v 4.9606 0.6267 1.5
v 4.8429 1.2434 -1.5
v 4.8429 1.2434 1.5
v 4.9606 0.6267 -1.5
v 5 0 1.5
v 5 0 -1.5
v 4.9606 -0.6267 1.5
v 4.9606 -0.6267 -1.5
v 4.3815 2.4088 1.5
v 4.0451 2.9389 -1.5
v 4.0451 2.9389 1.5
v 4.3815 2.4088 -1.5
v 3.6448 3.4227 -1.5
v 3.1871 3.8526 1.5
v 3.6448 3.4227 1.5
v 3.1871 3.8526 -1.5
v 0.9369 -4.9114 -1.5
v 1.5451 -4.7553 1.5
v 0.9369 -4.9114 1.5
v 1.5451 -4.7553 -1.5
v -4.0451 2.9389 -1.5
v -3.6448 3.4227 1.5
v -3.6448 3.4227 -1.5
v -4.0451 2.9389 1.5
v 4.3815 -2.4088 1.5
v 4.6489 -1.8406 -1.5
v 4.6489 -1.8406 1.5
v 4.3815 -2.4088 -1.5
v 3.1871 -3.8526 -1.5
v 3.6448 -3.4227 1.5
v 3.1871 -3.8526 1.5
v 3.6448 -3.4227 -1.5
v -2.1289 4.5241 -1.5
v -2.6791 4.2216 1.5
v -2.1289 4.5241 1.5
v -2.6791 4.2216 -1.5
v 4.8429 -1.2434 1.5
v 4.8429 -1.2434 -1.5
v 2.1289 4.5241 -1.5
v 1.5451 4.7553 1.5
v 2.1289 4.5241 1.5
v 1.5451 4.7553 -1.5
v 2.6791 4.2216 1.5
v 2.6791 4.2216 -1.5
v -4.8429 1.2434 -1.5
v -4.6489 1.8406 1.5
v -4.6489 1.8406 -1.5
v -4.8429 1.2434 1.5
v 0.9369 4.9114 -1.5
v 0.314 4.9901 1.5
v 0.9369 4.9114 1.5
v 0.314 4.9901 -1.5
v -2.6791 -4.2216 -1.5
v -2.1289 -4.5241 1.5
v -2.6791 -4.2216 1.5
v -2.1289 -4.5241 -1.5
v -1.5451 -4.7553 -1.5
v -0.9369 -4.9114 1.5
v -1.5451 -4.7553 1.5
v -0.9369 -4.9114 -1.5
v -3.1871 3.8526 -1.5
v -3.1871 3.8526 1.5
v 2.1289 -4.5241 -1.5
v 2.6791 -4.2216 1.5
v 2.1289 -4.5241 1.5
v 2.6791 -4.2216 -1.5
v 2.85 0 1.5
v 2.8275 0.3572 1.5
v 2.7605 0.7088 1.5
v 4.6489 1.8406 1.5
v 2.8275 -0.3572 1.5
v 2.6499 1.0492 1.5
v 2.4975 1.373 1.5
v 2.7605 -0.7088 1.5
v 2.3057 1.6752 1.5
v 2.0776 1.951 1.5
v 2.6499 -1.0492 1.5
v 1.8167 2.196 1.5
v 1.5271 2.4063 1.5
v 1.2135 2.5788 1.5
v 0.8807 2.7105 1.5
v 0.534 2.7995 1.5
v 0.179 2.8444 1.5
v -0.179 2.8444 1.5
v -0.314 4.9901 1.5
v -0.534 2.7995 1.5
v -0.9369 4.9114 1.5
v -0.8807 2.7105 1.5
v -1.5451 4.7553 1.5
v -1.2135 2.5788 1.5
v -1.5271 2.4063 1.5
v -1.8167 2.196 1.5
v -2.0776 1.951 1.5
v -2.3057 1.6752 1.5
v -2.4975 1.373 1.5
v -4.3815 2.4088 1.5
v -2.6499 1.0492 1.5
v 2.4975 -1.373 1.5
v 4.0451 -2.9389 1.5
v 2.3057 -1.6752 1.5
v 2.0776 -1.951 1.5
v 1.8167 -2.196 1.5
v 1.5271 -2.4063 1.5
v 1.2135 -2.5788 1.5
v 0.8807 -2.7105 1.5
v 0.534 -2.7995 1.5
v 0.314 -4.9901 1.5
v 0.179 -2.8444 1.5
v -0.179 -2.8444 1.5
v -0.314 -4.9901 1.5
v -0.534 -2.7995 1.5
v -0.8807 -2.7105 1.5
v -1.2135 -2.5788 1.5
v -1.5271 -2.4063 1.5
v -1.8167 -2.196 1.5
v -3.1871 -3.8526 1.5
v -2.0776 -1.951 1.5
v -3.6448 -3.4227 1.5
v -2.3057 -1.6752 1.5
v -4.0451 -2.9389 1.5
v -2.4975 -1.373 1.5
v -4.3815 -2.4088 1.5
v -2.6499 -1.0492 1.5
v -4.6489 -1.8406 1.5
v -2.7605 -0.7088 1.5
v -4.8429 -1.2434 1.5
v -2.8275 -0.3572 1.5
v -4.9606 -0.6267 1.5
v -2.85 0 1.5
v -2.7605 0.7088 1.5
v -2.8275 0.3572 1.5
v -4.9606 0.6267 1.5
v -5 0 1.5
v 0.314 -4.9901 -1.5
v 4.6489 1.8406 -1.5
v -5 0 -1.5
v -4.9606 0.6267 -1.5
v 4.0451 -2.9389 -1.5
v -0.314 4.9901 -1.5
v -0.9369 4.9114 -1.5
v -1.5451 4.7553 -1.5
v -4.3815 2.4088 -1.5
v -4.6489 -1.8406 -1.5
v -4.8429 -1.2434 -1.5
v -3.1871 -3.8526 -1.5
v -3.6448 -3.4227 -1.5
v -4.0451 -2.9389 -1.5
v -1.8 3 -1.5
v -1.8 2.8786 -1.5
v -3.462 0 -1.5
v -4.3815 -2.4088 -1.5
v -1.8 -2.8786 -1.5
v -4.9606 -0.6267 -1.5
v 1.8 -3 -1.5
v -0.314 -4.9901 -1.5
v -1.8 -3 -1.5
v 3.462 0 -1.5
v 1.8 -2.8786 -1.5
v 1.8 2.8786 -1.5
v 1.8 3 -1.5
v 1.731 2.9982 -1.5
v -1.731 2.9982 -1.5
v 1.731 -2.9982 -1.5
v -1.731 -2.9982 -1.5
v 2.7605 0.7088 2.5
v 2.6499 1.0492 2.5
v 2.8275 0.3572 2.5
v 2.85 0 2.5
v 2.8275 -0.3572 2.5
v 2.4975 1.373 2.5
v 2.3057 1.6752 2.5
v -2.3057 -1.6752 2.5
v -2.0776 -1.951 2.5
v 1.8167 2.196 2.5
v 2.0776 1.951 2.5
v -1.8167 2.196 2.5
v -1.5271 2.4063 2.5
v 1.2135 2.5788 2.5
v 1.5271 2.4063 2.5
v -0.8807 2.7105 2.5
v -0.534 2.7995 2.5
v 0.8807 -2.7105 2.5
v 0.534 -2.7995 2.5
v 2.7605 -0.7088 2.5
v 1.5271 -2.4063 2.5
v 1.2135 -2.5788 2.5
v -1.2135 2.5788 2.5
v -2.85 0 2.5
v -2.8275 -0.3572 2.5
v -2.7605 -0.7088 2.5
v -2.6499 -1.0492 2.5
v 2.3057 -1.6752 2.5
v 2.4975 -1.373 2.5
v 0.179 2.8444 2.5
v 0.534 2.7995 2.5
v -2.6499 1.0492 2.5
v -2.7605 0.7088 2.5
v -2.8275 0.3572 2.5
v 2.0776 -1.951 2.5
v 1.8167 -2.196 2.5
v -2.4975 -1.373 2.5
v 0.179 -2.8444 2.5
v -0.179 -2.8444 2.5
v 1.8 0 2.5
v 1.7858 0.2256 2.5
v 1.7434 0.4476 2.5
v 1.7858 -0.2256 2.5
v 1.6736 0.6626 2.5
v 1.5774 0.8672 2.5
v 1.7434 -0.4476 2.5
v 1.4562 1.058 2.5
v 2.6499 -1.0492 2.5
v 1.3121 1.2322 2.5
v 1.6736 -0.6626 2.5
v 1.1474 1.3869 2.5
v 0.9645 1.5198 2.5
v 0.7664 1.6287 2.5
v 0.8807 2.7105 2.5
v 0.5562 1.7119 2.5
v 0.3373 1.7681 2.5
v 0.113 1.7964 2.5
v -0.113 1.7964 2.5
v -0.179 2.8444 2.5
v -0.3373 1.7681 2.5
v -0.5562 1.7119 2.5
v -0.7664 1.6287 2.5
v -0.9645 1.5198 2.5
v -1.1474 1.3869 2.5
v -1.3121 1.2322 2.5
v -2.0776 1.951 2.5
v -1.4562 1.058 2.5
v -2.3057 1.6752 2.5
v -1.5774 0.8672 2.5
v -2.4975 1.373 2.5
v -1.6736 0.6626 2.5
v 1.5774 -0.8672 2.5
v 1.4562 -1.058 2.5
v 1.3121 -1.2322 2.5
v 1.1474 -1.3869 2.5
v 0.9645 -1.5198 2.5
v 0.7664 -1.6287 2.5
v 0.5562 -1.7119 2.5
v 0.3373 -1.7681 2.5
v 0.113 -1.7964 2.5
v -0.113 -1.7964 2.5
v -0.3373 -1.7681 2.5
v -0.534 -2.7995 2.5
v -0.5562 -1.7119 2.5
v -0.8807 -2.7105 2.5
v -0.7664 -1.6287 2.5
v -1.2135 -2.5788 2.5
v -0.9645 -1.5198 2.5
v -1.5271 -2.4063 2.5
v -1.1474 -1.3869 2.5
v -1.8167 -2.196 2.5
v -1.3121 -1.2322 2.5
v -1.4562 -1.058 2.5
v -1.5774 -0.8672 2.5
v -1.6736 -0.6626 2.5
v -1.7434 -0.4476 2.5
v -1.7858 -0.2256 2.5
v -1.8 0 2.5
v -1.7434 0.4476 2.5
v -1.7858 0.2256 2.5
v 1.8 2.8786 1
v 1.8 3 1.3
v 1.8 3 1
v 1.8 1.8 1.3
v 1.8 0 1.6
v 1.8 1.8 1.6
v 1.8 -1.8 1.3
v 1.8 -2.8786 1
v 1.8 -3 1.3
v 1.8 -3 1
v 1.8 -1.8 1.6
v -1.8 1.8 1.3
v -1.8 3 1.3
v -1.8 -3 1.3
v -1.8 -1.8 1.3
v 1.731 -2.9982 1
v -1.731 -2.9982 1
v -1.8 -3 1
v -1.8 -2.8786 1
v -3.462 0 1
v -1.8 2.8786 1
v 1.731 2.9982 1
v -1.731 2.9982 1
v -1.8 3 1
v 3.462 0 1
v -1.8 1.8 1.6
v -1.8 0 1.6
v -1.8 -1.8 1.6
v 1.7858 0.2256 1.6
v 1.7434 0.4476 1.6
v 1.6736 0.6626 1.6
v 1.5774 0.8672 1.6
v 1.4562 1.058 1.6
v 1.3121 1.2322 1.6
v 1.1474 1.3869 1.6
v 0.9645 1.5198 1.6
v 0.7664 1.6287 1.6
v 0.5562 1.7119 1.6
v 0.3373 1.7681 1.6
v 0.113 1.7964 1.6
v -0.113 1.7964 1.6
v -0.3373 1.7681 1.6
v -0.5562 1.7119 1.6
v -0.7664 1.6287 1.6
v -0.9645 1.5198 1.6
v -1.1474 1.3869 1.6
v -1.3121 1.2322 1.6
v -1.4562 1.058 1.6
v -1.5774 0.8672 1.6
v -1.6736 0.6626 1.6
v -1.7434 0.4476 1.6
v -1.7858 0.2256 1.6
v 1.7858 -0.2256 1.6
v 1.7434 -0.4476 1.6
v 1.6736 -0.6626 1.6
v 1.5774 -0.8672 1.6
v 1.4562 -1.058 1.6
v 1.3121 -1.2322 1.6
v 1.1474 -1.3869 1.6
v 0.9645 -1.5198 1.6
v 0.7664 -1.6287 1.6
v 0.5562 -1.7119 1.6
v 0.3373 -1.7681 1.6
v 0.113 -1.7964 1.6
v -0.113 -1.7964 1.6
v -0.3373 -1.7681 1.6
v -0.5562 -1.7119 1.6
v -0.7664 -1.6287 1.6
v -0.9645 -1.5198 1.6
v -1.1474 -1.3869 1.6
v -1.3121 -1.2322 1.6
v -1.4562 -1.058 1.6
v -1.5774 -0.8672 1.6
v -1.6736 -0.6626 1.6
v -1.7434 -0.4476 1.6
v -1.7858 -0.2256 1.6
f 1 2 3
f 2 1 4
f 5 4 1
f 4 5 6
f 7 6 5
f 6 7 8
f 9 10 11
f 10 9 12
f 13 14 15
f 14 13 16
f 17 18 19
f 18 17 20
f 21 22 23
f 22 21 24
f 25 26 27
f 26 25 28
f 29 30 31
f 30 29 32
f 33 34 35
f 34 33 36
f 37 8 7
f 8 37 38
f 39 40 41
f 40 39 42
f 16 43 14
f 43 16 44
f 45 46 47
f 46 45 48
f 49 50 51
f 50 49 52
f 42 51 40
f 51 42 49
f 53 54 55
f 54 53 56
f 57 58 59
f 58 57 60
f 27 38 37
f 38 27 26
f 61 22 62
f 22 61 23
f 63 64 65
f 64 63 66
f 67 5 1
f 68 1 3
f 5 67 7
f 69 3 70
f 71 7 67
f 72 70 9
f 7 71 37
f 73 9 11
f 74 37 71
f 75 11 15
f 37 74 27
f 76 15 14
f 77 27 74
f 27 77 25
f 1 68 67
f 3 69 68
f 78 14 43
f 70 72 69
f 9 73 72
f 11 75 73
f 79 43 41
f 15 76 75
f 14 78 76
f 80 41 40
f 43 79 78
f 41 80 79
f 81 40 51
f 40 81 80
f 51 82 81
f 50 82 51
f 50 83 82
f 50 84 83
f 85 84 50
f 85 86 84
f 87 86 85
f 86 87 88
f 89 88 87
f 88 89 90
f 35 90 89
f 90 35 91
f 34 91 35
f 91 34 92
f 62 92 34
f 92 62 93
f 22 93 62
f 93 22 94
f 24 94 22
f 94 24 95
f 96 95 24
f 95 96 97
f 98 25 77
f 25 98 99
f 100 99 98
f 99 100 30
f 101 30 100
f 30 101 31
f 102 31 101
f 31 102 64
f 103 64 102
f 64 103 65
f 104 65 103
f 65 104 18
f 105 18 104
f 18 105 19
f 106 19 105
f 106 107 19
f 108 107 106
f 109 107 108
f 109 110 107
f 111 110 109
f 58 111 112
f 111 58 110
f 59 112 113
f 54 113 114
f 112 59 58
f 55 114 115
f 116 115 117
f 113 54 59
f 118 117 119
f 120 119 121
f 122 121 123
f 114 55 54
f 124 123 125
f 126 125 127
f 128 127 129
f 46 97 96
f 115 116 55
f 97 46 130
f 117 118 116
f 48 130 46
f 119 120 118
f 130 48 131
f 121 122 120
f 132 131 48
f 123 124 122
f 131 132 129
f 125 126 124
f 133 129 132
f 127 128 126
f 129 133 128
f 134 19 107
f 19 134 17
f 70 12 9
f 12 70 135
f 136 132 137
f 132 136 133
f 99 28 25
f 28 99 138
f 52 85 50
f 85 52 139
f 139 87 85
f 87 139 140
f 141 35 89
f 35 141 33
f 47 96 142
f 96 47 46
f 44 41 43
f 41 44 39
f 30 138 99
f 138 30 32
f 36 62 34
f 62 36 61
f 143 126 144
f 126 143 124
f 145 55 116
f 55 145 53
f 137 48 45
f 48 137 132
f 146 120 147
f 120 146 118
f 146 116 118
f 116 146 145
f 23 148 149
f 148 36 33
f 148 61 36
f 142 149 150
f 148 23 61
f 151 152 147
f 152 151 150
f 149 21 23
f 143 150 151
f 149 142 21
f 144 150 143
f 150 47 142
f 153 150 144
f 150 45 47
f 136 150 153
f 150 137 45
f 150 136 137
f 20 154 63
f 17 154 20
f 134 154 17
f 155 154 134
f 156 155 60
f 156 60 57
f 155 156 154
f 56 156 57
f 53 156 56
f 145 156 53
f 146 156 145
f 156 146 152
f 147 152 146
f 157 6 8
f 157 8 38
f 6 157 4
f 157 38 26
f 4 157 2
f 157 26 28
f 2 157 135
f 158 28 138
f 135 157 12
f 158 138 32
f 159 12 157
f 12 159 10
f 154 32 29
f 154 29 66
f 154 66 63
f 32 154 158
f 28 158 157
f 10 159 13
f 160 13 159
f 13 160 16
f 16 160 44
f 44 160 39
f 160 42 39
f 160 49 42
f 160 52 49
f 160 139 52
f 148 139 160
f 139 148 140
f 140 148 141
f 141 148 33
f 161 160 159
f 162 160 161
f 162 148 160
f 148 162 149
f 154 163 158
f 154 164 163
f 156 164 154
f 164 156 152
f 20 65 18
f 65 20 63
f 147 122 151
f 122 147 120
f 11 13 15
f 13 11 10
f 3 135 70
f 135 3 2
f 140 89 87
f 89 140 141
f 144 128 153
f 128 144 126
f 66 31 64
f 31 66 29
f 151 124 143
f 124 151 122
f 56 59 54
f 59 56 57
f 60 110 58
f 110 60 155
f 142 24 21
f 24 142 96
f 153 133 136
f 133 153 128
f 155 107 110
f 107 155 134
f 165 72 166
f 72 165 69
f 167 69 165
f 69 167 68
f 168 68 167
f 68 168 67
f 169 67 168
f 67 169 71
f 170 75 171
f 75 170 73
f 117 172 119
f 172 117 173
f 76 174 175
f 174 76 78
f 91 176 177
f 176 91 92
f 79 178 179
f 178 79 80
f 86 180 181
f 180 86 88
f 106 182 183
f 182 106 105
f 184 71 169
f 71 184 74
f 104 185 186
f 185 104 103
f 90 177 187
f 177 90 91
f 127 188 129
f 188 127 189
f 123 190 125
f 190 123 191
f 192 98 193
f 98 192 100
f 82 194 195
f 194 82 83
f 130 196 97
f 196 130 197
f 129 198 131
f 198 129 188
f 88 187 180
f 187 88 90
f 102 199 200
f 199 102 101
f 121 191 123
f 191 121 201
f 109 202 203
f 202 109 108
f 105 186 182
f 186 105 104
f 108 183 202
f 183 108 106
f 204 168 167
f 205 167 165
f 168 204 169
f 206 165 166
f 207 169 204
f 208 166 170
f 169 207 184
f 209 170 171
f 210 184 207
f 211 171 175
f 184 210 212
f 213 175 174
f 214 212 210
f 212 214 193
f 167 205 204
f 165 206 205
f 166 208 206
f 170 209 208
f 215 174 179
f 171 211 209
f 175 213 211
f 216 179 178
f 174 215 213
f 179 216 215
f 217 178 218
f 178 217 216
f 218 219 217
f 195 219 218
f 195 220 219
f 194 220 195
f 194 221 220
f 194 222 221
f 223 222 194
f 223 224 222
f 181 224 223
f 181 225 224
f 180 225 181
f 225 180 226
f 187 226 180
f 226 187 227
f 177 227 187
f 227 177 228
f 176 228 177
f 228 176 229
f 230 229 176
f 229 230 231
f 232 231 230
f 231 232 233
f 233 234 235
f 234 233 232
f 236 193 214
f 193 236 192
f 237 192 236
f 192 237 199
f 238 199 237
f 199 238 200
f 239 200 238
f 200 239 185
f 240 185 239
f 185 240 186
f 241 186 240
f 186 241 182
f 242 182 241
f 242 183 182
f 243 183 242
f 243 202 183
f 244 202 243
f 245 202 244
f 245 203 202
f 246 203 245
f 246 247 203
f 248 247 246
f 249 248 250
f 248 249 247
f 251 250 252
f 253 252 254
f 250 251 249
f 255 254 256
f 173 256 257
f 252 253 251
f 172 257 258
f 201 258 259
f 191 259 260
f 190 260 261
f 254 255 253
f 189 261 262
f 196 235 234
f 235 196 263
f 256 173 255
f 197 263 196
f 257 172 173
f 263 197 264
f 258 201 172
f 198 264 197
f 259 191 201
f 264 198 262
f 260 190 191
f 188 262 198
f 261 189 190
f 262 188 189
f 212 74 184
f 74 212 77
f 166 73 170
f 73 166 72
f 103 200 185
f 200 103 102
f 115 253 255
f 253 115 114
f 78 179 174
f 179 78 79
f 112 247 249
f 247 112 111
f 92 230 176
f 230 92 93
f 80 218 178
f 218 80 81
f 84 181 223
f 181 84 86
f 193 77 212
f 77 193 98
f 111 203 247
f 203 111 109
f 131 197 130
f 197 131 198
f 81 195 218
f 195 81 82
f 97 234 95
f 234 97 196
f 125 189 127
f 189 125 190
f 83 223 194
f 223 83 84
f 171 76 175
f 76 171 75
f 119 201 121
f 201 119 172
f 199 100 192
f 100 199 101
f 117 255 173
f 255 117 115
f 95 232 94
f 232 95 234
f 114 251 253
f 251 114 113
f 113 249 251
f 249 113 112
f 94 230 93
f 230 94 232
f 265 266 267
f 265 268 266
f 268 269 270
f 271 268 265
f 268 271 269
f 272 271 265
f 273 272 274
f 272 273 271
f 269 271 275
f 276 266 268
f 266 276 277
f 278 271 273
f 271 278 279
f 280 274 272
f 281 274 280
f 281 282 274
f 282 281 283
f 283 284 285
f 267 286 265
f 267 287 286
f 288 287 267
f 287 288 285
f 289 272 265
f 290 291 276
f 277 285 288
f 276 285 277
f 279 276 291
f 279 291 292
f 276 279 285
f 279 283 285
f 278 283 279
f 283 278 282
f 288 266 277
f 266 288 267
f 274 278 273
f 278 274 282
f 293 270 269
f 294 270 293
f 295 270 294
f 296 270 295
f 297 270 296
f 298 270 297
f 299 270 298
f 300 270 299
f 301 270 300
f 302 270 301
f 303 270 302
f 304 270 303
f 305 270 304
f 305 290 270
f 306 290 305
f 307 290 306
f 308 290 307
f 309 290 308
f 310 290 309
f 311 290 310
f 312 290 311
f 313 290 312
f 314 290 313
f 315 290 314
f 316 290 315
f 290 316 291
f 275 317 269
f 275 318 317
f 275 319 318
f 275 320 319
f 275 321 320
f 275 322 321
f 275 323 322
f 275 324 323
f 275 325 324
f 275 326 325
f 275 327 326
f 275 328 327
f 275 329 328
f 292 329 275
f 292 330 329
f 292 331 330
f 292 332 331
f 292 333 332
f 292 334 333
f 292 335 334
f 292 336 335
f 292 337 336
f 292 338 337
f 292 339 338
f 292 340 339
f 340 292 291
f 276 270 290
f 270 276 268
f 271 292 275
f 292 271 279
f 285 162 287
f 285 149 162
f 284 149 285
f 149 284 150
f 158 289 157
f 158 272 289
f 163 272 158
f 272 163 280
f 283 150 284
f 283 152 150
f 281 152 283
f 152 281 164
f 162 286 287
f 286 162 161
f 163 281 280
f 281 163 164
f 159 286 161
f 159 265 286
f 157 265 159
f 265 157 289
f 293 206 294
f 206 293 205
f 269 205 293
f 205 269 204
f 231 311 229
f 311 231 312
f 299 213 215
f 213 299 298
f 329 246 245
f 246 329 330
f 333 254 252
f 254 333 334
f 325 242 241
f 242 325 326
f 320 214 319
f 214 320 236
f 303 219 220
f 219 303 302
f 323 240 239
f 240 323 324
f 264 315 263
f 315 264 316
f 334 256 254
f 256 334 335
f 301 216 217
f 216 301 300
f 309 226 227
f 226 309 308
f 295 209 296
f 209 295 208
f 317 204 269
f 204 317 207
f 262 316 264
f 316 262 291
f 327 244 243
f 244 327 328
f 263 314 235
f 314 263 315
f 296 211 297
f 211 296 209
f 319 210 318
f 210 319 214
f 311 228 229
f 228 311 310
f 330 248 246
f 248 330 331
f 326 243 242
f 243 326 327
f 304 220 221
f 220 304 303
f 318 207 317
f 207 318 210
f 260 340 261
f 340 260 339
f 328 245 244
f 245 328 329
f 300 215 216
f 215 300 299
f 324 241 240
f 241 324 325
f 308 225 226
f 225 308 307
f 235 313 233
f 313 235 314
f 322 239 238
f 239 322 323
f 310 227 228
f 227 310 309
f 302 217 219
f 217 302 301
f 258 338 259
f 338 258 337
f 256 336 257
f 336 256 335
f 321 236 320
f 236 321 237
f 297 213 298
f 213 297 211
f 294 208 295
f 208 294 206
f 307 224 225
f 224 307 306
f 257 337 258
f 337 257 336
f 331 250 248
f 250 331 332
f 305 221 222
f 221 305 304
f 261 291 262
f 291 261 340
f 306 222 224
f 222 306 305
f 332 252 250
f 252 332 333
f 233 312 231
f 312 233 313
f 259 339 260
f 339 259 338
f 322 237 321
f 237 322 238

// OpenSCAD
$fn = 50;


difference() {
	union() {
		translate(v = [0, 0, -1.5000000000]) {
			cylinder(h = 3, r = 5.0000000000);
		}
		translate(v = [0, 0, -1.5000000000]) {
			cylinder(h = 4, r = 2.8500000000);
		}
	}
	union() {
		translate(v = [0, 0, -1.5000000000]) {
			rotate(a = [0, 0, 0]) {
				difference() {
					union() {
						translate(v = [-1.8000000000, -3.0000000000, -0.3000000000]) {
							cube(size = [3.6000000000, 6.0000000000, 0.3000000000]);
						}
						translate(v = [-1.8000000000, -1.8000000000, -0.6000000000]) {
							cube(size = [3.6000000000, 3.6000000000, 0.3000000000]);
						}
						translate(v = [-1.8000000000, -3.0000000000, 2.5000000000]) {
							cube(size = [3.6000000000, 6.0000000000, 0.3000000000]);
						}
						translate(v = [-1.8000000000, -1.8000000000, 2.8000000000]) {
							cube(size = [3.6000000000, 3.6000000000, 0.3000000000]);
						}
						linear_extrude(height = 2.5000000000) {
							polygon(points = [[3.4620000000, 0.0000000000], [1.7310000000, 2.9981799479], [-1.7310000000, 2.9981799479], [-3.4620000000, 0.0000000000], [-1.7310000000, -2.9981799479], [1.7310000000, -2.9981799479]]);
						}
						translate(v = [-1.8000000000, -3.0000000000, -0.3000000000]) {
							cube(size = [3.6000000000, 6.0000000000, 0.3000000000]);
						}
						translate(v = [-1.8000000000, -1.8000000000, -0.6000000000]) {
							cube(size = [3.6000000000, 3.6000000000, 0.3000000000]);
						}
						translate(v = [-1.8000000000, -3.0000000000, 2.5000000000]) {
							cube(size = [3.6000000000, 6.0000000000, 0.3000000000]);
						}
						translate(v = [-1.8000000000, -1.8000000000, 2.8000000000]) {
							cube(size = [3.6000000000, 3.6000000000, 0.3000000000]);
						}
						translate(v = [-1.8000000000, -3.0000000000, -0.3000000000]) {
							cube(size = [3.6000000000, 6.0000000000, 0.3000000000]);
						}
						translate(v = [-1.8000000000, -1.8000000000, -0.6000000000]) {
							cube(size = [3.6000000000, 3.6000000000, 0.3000000000]);
						}
						translate(v = [-1.8000000000, -3.0000000000, 2.5000000000]) {
							cube(size = [3.6000000000, 6.0000000000, 0.3000000000]);
						}
						translate(v = [-1.8000000000, -1.8000000000, 2.8000000000]) {
							cube(size = [3.6000000000, 3.6000000000, 0.3000000000]);
						}
					}
					union();
				}
			}
		}
		translate(v = [0, 0, -50.0000000000]) {
			cylinder(h = 100, r = 1.8000000000);
		}
	}
}
